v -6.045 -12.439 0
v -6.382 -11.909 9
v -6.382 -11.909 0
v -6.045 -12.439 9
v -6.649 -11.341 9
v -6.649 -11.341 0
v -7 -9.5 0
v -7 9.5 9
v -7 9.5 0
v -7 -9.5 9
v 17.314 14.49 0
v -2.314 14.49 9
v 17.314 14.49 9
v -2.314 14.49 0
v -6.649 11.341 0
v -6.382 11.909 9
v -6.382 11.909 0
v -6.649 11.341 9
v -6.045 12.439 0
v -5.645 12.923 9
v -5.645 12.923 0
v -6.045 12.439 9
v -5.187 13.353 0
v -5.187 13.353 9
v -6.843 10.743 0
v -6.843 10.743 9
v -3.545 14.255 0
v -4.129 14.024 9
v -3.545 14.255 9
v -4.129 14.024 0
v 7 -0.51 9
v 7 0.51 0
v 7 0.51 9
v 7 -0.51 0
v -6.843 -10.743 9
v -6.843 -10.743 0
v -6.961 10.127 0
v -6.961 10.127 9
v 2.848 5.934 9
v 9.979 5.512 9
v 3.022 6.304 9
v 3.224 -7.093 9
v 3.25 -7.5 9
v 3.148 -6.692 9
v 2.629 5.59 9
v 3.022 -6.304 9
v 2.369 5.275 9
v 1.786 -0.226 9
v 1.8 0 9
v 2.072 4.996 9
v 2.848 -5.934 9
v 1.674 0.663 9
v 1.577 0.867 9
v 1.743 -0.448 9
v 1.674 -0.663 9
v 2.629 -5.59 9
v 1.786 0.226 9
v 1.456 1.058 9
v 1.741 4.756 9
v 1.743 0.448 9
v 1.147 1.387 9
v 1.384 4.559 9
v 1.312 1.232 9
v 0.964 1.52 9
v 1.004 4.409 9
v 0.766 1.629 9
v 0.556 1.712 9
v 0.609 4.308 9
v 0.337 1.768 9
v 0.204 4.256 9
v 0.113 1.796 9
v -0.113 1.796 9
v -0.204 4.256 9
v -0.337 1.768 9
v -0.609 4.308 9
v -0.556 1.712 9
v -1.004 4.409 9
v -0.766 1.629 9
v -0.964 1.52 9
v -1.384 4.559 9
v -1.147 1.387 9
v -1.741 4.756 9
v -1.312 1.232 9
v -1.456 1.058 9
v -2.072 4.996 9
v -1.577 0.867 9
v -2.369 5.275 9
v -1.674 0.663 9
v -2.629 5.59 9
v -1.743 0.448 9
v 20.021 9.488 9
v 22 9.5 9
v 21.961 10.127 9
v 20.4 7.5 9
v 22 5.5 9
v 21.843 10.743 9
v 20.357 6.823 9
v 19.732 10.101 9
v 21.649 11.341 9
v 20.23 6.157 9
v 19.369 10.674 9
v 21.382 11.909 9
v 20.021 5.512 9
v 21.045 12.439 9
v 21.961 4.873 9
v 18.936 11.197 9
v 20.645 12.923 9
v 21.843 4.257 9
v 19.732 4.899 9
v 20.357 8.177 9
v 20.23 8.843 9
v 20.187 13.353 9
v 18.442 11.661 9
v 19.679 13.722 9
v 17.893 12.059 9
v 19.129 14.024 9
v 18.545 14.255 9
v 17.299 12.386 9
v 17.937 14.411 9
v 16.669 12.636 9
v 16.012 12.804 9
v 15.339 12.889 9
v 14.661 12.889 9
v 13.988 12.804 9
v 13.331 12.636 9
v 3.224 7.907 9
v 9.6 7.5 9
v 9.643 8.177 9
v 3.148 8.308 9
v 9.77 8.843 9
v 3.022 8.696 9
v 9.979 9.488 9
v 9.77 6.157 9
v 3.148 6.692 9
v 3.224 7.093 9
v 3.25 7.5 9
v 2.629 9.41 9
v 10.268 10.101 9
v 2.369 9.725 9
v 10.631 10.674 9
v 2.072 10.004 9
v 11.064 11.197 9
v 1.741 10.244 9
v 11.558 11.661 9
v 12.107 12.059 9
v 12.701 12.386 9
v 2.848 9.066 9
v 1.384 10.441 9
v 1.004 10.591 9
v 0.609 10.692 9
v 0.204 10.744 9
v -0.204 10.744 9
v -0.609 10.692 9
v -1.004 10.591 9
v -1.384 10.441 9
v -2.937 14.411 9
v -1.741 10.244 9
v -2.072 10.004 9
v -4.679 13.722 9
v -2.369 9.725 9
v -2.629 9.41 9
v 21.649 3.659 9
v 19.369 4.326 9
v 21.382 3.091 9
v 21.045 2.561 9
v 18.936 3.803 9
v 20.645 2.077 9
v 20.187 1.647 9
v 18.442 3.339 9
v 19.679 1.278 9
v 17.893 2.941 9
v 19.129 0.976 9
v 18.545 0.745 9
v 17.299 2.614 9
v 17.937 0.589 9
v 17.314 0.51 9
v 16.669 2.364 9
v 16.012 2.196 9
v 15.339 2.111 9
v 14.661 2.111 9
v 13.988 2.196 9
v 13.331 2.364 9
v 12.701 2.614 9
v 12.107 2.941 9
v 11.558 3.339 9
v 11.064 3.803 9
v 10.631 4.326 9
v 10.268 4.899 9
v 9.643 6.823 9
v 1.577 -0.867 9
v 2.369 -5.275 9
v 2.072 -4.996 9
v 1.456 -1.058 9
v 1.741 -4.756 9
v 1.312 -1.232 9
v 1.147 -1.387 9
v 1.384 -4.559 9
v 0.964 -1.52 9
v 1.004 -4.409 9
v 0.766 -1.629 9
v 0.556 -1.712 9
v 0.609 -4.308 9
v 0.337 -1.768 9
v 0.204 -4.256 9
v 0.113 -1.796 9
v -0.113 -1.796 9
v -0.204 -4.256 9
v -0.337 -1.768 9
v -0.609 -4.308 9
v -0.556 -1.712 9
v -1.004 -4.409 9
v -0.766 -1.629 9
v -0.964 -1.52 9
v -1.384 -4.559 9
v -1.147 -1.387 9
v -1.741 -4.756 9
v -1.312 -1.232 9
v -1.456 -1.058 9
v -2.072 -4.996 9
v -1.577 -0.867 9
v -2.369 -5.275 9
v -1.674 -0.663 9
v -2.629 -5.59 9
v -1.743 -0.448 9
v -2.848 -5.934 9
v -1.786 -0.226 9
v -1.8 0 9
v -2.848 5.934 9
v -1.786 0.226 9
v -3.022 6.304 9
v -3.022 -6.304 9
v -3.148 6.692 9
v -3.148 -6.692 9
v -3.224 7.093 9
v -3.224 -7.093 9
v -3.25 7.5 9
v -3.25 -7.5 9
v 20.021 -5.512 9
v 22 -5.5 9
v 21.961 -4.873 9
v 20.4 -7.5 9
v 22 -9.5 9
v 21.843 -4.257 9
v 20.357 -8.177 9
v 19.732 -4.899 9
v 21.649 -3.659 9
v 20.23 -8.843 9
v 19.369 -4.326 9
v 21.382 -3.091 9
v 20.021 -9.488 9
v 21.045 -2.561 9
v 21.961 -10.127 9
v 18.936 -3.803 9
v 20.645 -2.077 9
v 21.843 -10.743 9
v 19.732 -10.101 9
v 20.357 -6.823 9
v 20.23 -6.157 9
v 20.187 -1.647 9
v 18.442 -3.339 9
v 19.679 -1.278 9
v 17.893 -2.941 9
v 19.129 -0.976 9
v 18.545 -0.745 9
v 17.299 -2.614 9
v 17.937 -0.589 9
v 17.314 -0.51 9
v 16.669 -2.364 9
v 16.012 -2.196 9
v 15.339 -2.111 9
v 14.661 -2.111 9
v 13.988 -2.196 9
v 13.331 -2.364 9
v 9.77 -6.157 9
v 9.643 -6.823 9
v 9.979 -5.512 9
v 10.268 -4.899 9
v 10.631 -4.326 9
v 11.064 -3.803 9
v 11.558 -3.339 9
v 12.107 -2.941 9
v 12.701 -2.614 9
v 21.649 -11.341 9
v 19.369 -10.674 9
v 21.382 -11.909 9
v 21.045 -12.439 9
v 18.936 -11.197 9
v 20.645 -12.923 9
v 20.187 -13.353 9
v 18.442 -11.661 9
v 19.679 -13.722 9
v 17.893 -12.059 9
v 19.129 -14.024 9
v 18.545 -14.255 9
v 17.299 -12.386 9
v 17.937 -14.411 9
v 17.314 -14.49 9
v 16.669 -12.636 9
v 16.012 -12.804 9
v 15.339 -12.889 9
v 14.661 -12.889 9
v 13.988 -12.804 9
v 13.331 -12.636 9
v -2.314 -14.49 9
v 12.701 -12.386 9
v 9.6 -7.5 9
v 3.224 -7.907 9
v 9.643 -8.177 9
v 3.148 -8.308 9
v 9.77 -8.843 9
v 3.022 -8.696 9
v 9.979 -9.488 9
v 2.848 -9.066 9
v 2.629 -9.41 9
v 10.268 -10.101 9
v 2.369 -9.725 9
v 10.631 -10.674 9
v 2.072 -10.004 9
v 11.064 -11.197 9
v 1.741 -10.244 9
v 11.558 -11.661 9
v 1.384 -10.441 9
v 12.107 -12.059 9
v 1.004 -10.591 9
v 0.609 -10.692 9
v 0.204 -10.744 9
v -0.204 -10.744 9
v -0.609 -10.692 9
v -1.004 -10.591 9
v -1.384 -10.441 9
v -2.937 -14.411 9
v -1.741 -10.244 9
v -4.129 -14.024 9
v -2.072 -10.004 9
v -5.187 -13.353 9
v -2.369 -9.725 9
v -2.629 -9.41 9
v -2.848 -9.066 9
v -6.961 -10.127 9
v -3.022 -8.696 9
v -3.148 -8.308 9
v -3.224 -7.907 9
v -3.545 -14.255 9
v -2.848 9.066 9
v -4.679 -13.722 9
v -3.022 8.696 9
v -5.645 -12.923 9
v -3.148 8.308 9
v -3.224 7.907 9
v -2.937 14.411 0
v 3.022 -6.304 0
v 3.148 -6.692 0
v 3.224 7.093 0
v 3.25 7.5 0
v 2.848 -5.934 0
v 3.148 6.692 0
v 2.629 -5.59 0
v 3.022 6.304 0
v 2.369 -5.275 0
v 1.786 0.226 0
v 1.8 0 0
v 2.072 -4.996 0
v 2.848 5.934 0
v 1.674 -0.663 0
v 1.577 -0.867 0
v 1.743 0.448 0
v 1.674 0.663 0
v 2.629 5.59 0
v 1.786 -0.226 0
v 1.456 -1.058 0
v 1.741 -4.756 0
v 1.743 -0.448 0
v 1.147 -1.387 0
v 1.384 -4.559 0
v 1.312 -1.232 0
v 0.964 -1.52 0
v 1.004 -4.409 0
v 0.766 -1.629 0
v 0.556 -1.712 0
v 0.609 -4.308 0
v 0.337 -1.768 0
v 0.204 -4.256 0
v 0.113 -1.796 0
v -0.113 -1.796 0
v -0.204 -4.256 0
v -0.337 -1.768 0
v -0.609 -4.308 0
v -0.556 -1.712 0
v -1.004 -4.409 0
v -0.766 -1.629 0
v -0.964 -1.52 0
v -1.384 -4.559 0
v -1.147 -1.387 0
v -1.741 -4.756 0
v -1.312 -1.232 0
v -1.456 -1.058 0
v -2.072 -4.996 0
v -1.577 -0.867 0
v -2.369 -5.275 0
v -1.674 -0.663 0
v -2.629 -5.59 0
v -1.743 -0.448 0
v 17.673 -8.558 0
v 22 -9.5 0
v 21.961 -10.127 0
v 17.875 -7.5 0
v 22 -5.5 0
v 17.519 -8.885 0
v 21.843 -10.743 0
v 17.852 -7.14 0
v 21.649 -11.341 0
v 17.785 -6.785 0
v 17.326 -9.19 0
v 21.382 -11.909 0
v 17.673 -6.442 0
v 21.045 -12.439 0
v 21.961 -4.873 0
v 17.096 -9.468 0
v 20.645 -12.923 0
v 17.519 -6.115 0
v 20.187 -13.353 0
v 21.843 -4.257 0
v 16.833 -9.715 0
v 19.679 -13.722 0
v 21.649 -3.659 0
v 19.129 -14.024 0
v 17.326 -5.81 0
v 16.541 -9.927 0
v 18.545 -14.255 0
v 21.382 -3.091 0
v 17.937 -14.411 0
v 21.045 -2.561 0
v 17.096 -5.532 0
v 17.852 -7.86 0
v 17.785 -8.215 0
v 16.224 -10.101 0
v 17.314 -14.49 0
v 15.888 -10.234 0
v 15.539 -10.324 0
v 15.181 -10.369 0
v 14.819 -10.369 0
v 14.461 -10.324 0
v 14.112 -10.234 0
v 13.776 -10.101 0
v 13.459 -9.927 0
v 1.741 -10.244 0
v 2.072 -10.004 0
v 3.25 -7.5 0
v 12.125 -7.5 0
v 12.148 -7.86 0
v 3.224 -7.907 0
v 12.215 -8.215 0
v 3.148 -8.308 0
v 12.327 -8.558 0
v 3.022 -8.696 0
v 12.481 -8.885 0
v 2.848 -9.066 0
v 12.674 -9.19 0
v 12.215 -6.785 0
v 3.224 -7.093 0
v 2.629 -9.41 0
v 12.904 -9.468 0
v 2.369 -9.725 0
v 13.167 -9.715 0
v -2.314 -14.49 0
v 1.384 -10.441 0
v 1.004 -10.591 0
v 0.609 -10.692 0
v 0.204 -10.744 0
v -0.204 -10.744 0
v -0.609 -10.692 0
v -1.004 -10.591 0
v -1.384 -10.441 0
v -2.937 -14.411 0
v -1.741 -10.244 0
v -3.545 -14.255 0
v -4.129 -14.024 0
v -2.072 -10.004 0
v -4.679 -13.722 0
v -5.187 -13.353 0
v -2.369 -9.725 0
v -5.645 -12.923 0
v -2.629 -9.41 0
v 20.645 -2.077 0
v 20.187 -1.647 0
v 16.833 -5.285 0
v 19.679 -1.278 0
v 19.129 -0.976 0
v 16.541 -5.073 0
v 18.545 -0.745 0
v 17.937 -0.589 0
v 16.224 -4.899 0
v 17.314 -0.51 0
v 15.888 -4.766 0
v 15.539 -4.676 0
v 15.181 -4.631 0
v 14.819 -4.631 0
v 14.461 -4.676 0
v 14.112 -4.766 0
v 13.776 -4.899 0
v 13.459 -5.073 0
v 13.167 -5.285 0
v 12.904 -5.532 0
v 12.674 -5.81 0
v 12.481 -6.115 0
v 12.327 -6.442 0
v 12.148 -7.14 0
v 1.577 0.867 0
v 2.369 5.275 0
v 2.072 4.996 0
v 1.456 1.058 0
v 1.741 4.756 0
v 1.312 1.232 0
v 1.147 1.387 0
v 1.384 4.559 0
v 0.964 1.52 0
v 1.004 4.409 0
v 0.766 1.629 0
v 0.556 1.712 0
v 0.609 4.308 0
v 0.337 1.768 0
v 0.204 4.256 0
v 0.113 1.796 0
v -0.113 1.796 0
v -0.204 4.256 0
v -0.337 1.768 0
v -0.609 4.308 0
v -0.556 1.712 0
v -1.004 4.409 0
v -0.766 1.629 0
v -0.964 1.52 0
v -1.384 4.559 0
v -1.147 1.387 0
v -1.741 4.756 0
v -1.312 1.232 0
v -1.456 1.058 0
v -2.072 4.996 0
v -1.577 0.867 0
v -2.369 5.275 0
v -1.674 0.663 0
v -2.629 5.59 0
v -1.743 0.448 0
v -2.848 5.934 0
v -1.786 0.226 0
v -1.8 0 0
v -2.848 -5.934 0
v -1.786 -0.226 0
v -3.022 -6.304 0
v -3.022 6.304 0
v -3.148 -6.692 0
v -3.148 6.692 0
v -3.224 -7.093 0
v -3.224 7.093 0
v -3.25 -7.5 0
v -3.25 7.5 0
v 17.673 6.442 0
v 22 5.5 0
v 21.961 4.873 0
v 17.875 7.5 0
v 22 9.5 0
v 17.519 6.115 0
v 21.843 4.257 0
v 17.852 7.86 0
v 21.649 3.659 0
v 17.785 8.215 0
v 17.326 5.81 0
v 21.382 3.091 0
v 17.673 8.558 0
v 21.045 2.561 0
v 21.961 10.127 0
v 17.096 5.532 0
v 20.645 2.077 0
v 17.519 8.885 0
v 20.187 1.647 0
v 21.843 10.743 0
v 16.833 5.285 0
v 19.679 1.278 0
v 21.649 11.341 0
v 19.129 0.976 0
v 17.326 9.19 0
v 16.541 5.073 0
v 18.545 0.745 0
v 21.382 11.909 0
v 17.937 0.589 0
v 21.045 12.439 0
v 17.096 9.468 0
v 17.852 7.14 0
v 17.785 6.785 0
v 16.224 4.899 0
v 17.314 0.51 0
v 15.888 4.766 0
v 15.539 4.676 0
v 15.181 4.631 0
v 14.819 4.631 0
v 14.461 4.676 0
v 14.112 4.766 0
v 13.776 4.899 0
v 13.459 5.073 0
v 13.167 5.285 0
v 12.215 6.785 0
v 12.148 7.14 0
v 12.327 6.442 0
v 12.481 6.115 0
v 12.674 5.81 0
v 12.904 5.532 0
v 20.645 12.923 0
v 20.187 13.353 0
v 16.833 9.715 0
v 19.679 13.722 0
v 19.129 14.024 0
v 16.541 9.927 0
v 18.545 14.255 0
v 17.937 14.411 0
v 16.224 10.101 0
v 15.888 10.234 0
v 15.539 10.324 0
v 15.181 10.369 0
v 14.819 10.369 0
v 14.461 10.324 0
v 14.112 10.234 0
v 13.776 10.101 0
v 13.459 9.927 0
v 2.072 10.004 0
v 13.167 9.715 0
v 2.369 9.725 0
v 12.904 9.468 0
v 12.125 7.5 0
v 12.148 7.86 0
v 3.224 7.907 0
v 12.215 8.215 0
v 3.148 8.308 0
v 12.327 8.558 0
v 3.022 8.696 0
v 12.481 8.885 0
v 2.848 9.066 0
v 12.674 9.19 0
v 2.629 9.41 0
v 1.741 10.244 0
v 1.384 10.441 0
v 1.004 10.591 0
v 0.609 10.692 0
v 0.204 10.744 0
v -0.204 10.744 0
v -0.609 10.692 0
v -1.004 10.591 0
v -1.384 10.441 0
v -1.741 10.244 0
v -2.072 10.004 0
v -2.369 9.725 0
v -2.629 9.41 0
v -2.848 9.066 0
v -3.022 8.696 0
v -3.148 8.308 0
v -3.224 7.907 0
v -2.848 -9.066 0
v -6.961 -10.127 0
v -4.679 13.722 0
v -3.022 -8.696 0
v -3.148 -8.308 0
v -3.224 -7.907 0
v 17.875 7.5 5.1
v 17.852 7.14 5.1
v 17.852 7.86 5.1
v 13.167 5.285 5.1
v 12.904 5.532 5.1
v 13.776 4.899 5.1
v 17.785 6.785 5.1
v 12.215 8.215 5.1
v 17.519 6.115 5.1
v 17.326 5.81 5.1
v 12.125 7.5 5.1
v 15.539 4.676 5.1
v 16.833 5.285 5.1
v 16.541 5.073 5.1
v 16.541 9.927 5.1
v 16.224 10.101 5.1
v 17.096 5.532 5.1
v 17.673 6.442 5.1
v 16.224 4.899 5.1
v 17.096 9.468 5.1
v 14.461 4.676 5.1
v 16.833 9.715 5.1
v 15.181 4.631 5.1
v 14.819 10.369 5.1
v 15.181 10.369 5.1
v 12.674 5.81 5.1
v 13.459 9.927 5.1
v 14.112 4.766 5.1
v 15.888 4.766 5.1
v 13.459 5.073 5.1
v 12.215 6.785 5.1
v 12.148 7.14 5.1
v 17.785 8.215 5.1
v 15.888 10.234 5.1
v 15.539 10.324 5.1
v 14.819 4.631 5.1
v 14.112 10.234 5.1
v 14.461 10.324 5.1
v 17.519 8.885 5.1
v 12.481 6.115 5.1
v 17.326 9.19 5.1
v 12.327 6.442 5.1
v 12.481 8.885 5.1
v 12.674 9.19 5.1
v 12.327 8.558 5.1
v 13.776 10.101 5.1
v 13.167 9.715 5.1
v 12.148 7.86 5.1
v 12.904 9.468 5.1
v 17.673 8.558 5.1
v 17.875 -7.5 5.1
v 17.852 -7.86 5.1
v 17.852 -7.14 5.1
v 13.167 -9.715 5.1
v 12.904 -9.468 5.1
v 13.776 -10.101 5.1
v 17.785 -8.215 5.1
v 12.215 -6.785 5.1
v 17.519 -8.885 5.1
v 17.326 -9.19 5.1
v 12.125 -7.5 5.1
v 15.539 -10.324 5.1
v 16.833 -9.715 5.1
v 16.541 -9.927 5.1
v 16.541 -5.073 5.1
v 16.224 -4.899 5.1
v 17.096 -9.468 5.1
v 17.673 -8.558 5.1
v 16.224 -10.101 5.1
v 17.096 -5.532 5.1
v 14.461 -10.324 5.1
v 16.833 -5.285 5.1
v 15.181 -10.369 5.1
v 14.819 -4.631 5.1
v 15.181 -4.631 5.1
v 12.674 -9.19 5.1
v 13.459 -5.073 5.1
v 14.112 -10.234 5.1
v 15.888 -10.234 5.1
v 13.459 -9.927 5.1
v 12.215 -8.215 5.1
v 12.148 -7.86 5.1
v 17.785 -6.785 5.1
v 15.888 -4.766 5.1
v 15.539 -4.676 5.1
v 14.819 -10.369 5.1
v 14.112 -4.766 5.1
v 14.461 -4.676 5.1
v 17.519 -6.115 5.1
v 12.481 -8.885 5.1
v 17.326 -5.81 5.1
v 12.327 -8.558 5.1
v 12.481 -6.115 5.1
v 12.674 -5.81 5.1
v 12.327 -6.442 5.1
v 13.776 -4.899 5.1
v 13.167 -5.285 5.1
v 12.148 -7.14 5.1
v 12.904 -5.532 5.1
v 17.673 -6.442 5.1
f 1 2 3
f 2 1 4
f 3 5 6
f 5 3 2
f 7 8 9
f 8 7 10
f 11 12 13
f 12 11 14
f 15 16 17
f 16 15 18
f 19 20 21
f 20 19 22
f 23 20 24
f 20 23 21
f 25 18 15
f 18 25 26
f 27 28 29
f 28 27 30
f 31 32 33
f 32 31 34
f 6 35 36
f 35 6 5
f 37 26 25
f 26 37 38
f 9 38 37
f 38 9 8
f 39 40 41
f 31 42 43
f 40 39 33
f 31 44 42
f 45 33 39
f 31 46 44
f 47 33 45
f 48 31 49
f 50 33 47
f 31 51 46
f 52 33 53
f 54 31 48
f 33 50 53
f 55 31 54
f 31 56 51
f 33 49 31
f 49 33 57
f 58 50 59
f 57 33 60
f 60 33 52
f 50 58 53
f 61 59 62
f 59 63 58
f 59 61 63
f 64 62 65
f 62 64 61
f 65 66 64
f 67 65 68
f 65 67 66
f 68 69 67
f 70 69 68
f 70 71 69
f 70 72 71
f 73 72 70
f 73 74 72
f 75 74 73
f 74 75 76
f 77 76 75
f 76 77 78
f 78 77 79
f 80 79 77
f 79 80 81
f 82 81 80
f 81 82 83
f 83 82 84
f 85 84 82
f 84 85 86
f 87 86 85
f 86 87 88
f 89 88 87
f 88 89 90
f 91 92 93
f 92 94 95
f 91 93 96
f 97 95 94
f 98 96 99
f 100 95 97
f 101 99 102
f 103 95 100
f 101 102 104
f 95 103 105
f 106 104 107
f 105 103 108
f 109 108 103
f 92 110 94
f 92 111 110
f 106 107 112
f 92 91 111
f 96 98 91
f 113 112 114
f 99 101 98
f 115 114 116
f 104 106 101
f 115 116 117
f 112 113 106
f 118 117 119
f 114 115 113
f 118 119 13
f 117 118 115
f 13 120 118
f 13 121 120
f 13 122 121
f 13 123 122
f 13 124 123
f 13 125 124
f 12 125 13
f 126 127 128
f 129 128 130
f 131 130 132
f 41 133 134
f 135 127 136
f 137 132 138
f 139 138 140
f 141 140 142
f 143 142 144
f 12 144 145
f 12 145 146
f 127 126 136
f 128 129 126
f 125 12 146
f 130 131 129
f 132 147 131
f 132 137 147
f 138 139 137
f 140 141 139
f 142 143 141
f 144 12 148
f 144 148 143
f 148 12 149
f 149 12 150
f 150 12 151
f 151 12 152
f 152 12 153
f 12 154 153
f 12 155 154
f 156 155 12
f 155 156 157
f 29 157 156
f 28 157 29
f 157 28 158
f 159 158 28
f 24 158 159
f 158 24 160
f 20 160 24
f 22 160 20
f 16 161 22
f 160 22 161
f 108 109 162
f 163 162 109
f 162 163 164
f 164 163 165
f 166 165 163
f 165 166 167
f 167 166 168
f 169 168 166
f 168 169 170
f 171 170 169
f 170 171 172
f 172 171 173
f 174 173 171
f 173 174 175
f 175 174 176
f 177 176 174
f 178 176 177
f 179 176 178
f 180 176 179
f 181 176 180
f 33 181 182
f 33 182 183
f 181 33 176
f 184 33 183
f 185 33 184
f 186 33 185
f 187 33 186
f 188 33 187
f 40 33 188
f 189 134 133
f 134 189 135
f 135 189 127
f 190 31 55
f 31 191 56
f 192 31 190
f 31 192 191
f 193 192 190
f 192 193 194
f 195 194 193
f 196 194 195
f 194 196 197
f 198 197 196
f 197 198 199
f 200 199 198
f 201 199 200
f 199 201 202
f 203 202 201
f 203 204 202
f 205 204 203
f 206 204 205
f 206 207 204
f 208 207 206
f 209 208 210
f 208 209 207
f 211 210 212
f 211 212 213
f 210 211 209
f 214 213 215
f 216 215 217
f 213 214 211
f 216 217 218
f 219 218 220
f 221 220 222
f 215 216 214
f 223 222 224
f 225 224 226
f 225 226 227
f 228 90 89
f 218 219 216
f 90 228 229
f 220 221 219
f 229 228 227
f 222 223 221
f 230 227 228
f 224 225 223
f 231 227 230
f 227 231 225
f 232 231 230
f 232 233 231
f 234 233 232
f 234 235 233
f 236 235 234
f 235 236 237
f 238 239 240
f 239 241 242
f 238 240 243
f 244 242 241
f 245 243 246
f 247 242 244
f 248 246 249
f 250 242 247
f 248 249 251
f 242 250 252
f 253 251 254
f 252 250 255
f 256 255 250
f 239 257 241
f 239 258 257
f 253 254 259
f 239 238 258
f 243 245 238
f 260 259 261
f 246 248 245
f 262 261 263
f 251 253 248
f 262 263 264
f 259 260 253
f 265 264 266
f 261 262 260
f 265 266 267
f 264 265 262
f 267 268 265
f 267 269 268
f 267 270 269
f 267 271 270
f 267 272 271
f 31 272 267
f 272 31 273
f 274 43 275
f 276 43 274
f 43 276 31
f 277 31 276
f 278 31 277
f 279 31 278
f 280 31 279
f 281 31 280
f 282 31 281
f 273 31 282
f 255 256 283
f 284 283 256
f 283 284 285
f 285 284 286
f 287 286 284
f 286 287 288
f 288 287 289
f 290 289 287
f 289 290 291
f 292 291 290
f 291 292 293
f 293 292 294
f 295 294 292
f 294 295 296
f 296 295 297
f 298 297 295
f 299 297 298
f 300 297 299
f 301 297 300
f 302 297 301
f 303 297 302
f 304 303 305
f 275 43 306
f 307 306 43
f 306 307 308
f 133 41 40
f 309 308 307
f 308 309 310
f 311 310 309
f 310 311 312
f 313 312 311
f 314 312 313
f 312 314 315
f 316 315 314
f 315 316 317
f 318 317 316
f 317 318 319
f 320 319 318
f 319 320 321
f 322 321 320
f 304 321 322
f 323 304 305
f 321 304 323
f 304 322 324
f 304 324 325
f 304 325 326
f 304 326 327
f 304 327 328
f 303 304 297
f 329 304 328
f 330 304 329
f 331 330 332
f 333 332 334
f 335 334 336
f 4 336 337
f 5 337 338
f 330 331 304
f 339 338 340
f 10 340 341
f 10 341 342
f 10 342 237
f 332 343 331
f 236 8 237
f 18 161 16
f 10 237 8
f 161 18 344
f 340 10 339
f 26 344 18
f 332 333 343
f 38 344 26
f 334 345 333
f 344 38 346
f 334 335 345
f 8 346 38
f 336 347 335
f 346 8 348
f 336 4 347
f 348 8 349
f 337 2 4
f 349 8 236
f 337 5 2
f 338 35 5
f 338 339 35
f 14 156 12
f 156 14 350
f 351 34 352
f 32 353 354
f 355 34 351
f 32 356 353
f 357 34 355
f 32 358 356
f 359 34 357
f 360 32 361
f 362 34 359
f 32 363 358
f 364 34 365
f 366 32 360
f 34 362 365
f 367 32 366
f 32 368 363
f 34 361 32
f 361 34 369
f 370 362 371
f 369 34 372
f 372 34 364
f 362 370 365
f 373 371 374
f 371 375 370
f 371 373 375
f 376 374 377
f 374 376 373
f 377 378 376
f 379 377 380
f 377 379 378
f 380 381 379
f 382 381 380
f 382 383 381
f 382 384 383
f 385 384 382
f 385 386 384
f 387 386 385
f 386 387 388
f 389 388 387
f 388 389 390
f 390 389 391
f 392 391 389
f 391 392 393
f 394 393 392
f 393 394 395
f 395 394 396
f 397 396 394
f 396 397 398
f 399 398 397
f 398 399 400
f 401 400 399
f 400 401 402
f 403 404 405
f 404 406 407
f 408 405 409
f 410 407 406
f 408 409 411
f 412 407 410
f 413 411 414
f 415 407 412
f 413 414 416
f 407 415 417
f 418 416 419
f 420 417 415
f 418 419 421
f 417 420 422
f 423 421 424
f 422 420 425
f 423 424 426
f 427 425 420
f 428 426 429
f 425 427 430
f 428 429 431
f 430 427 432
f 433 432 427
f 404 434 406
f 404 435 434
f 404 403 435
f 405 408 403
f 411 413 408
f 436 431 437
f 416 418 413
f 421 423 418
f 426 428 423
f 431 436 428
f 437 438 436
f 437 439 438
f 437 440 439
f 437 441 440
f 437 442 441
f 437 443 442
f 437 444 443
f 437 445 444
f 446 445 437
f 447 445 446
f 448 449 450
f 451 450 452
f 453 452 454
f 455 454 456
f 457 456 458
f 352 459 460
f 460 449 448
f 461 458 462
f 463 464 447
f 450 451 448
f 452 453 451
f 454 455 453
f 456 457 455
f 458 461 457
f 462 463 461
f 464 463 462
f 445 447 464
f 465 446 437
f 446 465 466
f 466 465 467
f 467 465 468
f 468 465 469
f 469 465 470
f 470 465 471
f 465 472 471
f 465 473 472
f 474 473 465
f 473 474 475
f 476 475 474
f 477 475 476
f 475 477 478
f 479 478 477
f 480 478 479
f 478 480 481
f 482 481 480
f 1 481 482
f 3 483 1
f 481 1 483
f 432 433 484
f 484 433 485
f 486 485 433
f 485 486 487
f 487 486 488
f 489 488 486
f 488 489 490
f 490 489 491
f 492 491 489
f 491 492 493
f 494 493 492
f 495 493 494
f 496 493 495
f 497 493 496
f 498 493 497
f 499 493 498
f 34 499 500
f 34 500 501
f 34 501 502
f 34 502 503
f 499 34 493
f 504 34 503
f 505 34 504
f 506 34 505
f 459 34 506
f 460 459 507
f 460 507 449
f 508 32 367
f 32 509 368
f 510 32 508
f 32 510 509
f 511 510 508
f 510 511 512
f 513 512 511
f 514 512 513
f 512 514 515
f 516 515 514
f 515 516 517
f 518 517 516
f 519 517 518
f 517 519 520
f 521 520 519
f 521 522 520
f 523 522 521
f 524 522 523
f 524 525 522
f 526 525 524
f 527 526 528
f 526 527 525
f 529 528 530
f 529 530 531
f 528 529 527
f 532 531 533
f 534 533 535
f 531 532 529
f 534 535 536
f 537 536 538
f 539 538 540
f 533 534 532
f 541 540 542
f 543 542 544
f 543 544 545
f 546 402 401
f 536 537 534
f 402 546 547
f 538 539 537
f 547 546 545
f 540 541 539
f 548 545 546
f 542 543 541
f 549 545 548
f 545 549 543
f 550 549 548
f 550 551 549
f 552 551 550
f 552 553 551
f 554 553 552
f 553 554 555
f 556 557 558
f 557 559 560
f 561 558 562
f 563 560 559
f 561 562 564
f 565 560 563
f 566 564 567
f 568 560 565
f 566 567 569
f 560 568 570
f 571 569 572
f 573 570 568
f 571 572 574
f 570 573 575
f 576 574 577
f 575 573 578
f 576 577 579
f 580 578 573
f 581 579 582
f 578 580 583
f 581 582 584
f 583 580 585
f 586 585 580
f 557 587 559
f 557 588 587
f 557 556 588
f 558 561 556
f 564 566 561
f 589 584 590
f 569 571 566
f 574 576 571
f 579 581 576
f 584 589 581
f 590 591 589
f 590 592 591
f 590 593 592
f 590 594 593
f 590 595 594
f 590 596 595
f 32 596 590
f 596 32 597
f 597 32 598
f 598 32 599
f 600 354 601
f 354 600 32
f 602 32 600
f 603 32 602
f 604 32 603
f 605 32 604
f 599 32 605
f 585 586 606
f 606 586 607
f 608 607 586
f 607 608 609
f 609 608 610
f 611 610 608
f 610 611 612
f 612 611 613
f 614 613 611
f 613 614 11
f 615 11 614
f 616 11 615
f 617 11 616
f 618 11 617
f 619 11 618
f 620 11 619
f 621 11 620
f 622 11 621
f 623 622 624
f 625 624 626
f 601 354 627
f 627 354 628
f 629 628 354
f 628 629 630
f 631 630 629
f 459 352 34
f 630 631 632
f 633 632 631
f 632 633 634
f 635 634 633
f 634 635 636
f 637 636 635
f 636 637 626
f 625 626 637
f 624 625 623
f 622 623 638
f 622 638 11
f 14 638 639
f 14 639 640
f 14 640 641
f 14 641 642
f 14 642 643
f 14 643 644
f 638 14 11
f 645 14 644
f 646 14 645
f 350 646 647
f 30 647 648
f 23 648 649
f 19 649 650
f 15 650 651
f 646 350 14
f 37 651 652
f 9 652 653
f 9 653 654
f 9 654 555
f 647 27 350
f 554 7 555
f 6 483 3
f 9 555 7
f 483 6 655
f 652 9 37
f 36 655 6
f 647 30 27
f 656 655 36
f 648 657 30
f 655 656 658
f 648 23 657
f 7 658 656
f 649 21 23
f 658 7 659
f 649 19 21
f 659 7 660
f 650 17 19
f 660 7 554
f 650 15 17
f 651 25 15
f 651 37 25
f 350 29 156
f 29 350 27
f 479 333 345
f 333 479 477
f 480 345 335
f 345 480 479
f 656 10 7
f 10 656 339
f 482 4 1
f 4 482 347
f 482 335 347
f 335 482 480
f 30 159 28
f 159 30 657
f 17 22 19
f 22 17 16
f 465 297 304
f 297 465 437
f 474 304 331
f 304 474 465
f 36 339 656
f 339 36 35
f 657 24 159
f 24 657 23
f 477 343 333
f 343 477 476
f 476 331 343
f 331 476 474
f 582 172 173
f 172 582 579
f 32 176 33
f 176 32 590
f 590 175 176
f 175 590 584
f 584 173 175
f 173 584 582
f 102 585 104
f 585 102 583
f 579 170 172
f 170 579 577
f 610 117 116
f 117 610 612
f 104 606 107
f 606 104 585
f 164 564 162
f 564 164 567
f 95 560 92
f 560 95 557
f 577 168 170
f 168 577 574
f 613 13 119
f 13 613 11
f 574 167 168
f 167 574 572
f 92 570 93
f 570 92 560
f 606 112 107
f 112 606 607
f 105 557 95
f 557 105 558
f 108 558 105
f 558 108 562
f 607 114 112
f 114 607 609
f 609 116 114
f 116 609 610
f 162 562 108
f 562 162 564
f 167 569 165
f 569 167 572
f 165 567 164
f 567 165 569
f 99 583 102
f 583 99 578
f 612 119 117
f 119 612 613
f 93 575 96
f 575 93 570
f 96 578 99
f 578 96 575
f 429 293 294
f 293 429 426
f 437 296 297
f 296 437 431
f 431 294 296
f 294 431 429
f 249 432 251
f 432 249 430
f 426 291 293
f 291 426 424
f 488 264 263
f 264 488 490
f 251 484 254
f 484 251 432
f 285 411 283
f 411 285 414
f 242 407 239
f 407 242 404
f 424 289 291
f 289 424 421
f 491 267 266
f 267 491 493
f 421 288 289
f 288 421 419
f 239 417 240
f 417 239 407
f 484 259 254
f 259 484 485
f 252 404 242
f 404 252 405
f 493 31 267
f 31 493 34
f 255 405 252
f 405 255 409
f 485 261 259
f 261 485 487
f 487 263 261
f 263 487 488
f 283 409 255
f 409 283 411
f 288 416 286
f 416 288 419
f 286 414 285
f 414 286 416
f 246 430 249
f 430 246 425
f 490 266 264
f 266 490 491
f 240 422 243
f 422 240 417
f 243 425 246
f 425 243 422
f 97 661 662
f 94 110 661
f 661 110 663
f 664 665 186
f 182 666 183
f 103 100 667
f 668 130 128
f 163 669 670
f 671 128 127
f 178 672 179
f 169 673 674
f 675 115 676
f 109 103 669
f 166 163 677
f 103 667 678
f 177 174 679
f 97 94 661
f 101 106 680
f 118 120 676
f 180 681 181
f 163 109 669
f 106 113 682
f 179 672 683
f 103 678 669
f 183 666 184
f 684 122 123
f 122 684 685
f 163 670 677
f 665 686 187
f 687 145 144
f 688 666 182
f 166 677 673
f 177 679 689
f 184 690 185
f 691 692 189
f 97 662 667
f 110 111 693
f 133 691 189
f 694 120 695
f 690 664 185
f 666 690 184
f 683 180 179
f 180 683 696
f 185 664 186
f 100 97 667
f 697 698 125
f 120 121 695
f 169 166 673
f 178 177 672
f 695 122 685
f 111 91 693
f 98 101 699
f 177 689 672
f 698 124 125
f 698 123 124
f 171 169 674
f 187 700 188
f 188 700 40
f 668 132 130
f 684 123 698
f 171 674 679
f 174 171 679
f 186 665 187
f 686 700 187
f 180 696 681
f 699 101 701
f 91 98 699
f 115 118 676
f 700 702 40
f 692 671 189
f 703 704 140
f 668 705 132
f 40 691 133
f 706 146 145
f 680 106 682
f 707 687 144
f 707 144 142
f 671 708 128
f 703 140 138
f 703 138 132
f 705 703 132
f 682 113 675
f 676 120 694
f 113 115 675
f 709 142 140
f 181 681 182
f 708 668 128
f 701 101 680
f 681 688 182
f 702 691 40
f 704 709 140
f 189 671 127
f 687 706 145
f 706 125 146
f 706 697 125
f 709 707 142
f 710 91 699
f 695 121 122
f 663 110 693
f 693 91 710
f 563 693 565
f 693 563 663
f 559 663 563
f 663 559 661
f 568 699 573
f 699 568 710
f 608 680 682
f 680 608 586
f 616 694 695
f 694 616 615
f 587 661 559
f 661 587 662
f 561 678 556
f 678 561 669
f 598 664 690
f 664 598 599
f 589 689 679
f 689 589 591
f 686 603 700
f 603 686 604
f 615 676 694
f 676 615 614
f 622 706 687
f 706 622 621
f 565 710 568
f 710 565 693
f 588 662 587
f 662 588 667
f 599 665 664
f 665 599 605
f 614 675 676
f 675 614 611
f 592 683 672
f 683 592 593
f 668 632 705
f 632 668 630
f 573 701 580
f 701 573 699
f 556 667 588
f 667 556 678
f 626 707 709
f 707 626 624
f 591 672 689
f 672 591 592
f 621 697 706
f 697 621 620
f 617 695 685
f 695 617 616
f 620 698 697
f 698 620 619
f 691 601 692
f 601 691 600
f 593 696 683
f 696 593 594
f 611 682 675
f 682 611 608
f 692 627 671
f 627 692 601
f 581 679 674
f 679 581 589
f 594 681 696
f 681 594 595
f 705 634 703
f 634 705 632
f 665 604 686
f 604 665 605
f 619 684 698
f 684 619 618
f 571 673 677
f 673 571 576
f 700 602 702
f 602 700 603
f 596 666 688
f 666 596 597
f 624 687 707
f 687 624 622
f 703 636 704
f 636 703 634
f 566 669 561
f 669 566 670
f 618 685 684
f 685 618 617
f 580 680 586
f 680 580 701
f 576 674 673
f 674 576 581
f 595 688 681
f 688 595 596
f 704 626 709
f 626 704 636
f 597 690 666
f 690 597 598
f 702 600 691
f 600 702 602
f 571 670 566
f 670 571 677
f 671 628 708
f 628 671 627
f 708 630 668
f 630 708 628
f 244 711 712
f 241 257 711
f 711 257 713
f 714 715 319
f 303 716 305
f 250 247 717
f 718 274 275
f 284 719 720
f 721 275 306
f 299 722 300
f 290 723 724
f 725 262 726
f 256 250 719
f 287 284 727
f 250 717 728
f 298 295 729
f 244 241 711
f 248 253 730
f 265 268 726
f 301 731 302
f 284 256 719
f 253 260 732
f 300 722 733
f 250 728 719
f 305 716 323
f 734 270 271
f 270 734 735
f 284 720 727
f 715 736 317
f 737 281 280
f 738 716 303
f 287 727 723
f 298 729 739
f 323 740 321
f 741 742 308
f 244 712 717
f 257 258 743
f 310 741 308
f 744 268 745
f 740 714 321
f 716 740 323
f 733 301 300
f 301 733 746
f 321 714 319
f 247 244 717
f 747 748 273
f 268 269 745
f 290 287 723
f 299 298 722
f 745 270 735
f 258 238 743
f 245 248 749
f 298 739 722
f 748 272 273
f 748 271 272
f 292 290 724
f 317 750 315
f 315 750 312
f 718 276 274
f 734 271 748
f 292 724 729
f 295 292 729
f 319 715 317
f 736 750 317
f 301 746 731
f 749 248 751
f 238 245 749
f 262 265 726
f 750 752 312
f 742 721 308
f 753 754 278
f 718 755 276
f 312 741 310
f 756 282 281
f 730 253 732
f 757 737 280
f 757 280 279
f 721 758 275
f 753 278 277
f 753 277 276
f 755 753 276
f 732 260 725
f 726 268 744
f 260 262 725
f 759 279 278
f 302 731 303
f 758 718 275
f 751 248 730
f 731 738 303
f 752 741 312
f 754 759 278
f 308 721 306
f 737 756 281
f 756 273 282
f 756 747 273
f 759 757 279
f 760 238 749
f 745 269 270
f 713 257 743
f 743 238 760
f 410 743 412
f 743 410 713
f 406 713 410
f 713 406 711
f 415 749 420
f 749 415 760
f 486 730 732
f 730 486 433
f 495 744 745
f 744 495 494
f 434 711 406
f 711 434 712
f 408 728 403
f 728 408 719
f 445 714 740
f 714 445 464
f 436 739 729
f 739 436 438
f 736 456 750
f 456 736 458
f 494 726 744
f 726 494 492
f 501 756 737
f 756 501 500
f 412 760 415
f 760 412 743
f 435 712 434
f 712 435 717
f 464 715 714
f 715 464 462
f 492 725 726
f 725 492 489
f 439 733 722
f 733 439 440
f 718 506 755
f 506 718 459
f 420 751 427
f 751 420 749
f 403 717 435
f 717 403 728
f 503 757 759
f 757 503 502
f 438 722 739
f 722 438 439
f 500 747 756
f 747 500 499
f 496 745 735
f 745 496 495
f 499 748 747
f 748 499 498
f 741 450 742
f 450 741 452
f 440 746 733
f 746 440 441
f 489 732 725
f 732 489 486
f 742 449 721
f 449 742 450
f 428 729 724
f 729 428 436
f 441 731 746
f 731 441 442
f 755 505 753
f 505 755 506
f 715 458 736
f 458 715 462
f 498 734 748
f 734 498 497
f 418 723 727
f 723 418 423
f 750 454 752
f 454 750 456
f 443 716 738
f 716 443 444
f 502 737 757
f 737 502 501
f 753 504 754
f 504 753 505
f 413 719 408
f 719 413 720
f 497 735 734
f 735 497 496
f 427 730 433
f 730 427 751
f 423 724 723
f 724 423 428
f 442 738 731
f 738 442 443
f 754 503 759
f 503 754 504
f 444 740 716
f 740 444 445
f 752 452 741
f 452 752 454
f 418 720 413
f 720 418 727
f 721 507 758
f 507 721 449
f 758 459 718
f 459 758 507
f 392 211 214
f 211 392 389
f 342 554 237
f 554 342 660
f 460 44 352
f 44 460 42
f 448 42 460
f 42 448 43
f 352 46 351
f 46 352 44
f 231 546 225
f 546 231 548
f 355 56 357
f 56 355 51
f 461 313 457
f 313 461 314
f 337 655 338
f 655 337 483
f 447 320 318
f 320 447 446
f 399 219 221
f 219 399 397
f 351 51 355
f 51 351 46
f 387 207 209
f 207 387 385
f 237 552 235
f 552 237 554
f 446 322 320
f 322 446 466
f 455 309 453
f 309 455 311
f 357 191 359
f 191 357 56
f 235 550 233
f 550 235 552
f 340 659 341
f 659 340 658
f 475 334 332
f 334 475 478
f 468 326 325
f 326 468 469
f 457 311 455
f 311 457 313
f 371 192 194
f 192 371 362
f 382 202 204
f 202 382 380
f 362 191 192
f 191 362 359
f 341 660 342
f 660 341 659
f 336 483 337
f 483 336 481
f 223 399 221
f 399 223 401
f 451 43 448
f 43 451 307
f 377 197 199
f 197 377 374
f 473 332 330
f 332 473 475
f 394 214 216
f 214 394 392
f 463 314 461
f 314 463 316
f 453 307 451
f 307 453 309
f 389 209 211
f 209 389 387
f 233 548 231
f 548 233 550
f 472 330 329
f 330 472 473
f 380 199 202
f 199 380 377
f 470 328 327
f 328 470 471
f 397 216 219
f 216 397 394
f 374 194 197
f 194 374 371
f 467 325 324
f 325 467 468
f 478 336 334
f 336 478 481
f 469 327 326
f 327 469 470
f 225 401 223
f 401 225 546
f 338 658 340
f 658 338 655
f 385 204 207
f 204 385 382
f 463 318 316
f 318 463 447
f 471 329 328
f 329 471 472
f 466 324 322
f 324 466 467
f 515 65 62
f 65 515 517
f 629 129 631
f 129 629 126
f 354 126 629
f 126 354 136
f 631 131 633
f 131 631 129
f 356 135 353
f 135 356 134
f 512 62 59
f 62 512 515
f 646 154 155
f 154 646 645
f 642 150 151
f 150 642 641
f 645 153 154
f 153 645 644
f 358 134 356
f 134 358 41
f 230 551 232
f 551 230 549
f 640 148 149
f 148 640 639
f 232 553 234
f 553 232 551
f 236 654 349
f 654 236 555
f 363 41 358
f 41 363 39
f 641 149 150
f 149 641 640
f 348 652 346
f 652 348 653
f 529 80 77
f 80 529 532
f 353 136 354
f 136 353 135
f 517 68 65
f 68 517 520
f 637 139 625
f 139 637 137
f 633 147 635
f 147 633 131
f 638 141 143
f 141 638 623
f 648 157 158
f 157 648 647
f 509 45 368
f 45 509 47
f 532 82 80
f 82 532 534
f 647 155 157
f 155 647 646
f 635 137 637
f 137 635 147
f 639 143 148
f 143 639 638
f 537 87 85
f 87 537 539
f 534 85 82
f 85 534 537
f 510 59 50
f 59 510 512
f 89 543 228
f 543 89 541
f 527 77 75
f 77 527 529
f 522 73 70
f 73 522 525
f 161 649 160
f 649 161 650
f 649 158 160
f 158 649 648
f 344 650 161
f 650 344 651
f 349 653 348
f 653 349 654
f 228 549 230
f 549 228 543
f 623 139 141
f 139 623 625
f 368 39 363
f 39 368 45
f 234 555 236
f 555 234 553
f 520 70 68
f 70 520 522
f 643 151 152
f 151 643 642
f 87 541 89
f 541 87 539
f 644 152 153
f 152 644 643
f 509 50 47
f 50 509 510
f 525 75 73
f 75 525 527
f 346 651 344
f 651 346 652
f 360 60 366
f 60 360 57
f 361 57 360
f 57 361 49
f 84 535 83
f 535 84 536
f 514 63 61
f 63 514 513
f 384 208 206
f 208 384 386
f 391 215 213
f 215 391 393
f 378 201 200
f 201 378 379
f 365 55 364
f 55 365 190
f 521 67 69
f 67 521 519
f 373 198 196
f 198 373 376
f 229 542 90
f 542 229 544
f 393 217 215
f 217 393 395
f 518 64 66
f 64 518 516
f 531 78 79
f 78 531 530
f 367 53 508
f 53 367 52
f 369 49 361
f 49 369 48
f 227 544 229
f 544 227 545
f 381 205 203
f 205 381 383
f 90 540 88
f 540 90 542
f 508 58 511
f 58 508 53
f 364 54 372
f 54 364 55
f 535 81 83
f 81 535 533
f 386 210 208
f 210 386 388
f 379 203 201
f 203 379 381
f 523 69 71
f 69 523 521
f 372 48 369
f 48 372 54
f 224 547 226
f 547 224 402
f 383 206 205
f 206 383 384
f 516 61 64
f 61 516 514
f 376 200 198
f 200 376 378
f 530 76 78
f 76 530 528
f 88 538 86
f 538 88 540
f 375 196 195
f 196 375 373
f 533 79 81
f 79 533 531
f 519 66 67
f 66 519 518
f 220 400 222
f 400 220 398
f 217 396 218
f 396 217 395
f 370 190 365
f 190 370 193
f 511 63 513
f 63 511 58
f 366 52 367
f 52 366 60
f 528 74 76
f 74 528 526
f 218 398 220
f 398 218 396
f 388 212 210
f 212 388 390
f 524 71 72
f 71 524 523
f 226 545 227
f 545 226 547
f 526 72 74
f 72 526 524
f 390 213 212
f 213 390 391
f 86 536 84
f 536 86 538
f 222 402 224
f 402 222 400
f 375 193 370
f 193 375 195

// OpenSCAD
$fn = 50;


difference() {
	union() {
		hull() {
			translate(v = [-2.0000000000, 9.5000000000, 0]) {
				cylinder(h = 9, r = 5);
			}
			translate(v = [2.0000000000, 9.5000000000, 0]) {
				cylinder(h = 9, r = 5);
			}
			translate(v = [-2.0000000000, -9.5000000000, 0]) {
				cylinder(h = 9, r = 5);
			}
			translate(v = [2.0000000000, -9.5000000000, 0]) {
				cylinder(h = 9, r = 5);
			}
		}
		translate(v = [7.5000000000, 7.5000000000, 0]) {
			hull() {
				translate(v = [-9.5000000000, 2.0000000000, 0]) {
					cylinder(h = 9, r = 5);
				}
				translate(v = [9.5000000000, 2.0000000000, 0]) {
					cylinder(h = 9, r = 5);
				}
				translate(v = [-9.5000000000, -2.0000000000, 0]) {
					cylinder(h = 9, r = 5);
				}
				translate(v = [9.5000000000, -2.0000000000, 0]) {
					cylinder(h = 9, r = 5);
				}
			}
		}
		translate(v = [7.5000000000, -7.5000000000, 0]) {
			hull() {
				translate(v = [-9.5000000000, 2.0000000000, 0]) {
					cylinder(h = 9, r = 5);
				}
				translate(v = [9.5000000000, 2.0000000000, 0]) {
					cylinder(h = 9, r = 5);
				}
				translate(v = [-9.5000000000, -2.0000000000, 0]) {
					cylinder(h = 9, r = 5);
				}
				translate(v = [9.5000000000, -2.0000000000, 0]) {
					cylinder(h = 9, r = 5);
				}
			}
		}
	}
	union() {
		translate(v = [15.0000000000, 7.5000000000, 9]) {
			rotate(a = [0, 0, 0]) {
				difference() {
					union() {
						#translate(v = [0, 0, -9.0000000000]) {
							cylinder(h = 9, r = 2.6000000000);
						}
						#translate(v = [0, 0, -3.9000000000]) {
							cylinder(h = 3.9000000000, r1 = 2.8750000000, r2 = 5.4000000000);
						}
						#translate(v = [0, 0, -9.0000000000]) {
							cylinder(h = 9, r = 2.8750000000);
						}
						#translate(v = [0, 0, -9.0000000000]) {
							cylinder(h = 9, r = 2.6000000000);
						}
					}
					union();
				}
			}
		}
		translate(v = [15.0000000000, -7.5000000000, 9]) {
			rotate(a = [0, 0, 0]) {
				difference() {
					union() {
						#translate(v = [0, 0, -9.0000000000]) {
							cylinder(h = 9, r = 2.6000000000);
						}
						#translate(v = [0, 0, -3.9000000000]) {
							cylinder(h = 3.9000000000, r1 = 2.8750000000, r2 = 5.4000000000);
						}
						#translate(v = [0, 0, -9.0000000000]) {
							cylinder(h = 9, r = 2.8750000000);
						}
						#translate(v = [0, 0, -9.0000000000]) {
							cylinder(h = 9, r = 2.6000000000);
						}
					}
					union();
				}
			}
		}
		translate(v = [0.0000000000, -7.5000000000, 0]) {
			translate(v = [0, 0, -100]) {
				cylinder(h = 200, r = 3.2500000000);
			}
		}
		translate(v = [0.0000000000, 7.5000000000, 0]) {
			translate(v = [0, 0, -100]) {
				cylinder(h = 200, r = 3.2500000000);
			}
		}
		translate(v = [0.0000000000, -7.5000000000, 0]) {
			translate(v = [0, 0, -100]) {
				cylinder(h = 200, r = 1.8000000000);
			}
		}
		translate(v = [0, 0, -100]) {
			cylinder(h = 200, r = 1.8000000000);
		}
		translate(v = [0.0000000000, 7.5000000000, 0]) {
			translate(v = [0, 0, -100]) {
				cylinder(h = 200, r = 1.8000000000);
			}
		}
	}
}
